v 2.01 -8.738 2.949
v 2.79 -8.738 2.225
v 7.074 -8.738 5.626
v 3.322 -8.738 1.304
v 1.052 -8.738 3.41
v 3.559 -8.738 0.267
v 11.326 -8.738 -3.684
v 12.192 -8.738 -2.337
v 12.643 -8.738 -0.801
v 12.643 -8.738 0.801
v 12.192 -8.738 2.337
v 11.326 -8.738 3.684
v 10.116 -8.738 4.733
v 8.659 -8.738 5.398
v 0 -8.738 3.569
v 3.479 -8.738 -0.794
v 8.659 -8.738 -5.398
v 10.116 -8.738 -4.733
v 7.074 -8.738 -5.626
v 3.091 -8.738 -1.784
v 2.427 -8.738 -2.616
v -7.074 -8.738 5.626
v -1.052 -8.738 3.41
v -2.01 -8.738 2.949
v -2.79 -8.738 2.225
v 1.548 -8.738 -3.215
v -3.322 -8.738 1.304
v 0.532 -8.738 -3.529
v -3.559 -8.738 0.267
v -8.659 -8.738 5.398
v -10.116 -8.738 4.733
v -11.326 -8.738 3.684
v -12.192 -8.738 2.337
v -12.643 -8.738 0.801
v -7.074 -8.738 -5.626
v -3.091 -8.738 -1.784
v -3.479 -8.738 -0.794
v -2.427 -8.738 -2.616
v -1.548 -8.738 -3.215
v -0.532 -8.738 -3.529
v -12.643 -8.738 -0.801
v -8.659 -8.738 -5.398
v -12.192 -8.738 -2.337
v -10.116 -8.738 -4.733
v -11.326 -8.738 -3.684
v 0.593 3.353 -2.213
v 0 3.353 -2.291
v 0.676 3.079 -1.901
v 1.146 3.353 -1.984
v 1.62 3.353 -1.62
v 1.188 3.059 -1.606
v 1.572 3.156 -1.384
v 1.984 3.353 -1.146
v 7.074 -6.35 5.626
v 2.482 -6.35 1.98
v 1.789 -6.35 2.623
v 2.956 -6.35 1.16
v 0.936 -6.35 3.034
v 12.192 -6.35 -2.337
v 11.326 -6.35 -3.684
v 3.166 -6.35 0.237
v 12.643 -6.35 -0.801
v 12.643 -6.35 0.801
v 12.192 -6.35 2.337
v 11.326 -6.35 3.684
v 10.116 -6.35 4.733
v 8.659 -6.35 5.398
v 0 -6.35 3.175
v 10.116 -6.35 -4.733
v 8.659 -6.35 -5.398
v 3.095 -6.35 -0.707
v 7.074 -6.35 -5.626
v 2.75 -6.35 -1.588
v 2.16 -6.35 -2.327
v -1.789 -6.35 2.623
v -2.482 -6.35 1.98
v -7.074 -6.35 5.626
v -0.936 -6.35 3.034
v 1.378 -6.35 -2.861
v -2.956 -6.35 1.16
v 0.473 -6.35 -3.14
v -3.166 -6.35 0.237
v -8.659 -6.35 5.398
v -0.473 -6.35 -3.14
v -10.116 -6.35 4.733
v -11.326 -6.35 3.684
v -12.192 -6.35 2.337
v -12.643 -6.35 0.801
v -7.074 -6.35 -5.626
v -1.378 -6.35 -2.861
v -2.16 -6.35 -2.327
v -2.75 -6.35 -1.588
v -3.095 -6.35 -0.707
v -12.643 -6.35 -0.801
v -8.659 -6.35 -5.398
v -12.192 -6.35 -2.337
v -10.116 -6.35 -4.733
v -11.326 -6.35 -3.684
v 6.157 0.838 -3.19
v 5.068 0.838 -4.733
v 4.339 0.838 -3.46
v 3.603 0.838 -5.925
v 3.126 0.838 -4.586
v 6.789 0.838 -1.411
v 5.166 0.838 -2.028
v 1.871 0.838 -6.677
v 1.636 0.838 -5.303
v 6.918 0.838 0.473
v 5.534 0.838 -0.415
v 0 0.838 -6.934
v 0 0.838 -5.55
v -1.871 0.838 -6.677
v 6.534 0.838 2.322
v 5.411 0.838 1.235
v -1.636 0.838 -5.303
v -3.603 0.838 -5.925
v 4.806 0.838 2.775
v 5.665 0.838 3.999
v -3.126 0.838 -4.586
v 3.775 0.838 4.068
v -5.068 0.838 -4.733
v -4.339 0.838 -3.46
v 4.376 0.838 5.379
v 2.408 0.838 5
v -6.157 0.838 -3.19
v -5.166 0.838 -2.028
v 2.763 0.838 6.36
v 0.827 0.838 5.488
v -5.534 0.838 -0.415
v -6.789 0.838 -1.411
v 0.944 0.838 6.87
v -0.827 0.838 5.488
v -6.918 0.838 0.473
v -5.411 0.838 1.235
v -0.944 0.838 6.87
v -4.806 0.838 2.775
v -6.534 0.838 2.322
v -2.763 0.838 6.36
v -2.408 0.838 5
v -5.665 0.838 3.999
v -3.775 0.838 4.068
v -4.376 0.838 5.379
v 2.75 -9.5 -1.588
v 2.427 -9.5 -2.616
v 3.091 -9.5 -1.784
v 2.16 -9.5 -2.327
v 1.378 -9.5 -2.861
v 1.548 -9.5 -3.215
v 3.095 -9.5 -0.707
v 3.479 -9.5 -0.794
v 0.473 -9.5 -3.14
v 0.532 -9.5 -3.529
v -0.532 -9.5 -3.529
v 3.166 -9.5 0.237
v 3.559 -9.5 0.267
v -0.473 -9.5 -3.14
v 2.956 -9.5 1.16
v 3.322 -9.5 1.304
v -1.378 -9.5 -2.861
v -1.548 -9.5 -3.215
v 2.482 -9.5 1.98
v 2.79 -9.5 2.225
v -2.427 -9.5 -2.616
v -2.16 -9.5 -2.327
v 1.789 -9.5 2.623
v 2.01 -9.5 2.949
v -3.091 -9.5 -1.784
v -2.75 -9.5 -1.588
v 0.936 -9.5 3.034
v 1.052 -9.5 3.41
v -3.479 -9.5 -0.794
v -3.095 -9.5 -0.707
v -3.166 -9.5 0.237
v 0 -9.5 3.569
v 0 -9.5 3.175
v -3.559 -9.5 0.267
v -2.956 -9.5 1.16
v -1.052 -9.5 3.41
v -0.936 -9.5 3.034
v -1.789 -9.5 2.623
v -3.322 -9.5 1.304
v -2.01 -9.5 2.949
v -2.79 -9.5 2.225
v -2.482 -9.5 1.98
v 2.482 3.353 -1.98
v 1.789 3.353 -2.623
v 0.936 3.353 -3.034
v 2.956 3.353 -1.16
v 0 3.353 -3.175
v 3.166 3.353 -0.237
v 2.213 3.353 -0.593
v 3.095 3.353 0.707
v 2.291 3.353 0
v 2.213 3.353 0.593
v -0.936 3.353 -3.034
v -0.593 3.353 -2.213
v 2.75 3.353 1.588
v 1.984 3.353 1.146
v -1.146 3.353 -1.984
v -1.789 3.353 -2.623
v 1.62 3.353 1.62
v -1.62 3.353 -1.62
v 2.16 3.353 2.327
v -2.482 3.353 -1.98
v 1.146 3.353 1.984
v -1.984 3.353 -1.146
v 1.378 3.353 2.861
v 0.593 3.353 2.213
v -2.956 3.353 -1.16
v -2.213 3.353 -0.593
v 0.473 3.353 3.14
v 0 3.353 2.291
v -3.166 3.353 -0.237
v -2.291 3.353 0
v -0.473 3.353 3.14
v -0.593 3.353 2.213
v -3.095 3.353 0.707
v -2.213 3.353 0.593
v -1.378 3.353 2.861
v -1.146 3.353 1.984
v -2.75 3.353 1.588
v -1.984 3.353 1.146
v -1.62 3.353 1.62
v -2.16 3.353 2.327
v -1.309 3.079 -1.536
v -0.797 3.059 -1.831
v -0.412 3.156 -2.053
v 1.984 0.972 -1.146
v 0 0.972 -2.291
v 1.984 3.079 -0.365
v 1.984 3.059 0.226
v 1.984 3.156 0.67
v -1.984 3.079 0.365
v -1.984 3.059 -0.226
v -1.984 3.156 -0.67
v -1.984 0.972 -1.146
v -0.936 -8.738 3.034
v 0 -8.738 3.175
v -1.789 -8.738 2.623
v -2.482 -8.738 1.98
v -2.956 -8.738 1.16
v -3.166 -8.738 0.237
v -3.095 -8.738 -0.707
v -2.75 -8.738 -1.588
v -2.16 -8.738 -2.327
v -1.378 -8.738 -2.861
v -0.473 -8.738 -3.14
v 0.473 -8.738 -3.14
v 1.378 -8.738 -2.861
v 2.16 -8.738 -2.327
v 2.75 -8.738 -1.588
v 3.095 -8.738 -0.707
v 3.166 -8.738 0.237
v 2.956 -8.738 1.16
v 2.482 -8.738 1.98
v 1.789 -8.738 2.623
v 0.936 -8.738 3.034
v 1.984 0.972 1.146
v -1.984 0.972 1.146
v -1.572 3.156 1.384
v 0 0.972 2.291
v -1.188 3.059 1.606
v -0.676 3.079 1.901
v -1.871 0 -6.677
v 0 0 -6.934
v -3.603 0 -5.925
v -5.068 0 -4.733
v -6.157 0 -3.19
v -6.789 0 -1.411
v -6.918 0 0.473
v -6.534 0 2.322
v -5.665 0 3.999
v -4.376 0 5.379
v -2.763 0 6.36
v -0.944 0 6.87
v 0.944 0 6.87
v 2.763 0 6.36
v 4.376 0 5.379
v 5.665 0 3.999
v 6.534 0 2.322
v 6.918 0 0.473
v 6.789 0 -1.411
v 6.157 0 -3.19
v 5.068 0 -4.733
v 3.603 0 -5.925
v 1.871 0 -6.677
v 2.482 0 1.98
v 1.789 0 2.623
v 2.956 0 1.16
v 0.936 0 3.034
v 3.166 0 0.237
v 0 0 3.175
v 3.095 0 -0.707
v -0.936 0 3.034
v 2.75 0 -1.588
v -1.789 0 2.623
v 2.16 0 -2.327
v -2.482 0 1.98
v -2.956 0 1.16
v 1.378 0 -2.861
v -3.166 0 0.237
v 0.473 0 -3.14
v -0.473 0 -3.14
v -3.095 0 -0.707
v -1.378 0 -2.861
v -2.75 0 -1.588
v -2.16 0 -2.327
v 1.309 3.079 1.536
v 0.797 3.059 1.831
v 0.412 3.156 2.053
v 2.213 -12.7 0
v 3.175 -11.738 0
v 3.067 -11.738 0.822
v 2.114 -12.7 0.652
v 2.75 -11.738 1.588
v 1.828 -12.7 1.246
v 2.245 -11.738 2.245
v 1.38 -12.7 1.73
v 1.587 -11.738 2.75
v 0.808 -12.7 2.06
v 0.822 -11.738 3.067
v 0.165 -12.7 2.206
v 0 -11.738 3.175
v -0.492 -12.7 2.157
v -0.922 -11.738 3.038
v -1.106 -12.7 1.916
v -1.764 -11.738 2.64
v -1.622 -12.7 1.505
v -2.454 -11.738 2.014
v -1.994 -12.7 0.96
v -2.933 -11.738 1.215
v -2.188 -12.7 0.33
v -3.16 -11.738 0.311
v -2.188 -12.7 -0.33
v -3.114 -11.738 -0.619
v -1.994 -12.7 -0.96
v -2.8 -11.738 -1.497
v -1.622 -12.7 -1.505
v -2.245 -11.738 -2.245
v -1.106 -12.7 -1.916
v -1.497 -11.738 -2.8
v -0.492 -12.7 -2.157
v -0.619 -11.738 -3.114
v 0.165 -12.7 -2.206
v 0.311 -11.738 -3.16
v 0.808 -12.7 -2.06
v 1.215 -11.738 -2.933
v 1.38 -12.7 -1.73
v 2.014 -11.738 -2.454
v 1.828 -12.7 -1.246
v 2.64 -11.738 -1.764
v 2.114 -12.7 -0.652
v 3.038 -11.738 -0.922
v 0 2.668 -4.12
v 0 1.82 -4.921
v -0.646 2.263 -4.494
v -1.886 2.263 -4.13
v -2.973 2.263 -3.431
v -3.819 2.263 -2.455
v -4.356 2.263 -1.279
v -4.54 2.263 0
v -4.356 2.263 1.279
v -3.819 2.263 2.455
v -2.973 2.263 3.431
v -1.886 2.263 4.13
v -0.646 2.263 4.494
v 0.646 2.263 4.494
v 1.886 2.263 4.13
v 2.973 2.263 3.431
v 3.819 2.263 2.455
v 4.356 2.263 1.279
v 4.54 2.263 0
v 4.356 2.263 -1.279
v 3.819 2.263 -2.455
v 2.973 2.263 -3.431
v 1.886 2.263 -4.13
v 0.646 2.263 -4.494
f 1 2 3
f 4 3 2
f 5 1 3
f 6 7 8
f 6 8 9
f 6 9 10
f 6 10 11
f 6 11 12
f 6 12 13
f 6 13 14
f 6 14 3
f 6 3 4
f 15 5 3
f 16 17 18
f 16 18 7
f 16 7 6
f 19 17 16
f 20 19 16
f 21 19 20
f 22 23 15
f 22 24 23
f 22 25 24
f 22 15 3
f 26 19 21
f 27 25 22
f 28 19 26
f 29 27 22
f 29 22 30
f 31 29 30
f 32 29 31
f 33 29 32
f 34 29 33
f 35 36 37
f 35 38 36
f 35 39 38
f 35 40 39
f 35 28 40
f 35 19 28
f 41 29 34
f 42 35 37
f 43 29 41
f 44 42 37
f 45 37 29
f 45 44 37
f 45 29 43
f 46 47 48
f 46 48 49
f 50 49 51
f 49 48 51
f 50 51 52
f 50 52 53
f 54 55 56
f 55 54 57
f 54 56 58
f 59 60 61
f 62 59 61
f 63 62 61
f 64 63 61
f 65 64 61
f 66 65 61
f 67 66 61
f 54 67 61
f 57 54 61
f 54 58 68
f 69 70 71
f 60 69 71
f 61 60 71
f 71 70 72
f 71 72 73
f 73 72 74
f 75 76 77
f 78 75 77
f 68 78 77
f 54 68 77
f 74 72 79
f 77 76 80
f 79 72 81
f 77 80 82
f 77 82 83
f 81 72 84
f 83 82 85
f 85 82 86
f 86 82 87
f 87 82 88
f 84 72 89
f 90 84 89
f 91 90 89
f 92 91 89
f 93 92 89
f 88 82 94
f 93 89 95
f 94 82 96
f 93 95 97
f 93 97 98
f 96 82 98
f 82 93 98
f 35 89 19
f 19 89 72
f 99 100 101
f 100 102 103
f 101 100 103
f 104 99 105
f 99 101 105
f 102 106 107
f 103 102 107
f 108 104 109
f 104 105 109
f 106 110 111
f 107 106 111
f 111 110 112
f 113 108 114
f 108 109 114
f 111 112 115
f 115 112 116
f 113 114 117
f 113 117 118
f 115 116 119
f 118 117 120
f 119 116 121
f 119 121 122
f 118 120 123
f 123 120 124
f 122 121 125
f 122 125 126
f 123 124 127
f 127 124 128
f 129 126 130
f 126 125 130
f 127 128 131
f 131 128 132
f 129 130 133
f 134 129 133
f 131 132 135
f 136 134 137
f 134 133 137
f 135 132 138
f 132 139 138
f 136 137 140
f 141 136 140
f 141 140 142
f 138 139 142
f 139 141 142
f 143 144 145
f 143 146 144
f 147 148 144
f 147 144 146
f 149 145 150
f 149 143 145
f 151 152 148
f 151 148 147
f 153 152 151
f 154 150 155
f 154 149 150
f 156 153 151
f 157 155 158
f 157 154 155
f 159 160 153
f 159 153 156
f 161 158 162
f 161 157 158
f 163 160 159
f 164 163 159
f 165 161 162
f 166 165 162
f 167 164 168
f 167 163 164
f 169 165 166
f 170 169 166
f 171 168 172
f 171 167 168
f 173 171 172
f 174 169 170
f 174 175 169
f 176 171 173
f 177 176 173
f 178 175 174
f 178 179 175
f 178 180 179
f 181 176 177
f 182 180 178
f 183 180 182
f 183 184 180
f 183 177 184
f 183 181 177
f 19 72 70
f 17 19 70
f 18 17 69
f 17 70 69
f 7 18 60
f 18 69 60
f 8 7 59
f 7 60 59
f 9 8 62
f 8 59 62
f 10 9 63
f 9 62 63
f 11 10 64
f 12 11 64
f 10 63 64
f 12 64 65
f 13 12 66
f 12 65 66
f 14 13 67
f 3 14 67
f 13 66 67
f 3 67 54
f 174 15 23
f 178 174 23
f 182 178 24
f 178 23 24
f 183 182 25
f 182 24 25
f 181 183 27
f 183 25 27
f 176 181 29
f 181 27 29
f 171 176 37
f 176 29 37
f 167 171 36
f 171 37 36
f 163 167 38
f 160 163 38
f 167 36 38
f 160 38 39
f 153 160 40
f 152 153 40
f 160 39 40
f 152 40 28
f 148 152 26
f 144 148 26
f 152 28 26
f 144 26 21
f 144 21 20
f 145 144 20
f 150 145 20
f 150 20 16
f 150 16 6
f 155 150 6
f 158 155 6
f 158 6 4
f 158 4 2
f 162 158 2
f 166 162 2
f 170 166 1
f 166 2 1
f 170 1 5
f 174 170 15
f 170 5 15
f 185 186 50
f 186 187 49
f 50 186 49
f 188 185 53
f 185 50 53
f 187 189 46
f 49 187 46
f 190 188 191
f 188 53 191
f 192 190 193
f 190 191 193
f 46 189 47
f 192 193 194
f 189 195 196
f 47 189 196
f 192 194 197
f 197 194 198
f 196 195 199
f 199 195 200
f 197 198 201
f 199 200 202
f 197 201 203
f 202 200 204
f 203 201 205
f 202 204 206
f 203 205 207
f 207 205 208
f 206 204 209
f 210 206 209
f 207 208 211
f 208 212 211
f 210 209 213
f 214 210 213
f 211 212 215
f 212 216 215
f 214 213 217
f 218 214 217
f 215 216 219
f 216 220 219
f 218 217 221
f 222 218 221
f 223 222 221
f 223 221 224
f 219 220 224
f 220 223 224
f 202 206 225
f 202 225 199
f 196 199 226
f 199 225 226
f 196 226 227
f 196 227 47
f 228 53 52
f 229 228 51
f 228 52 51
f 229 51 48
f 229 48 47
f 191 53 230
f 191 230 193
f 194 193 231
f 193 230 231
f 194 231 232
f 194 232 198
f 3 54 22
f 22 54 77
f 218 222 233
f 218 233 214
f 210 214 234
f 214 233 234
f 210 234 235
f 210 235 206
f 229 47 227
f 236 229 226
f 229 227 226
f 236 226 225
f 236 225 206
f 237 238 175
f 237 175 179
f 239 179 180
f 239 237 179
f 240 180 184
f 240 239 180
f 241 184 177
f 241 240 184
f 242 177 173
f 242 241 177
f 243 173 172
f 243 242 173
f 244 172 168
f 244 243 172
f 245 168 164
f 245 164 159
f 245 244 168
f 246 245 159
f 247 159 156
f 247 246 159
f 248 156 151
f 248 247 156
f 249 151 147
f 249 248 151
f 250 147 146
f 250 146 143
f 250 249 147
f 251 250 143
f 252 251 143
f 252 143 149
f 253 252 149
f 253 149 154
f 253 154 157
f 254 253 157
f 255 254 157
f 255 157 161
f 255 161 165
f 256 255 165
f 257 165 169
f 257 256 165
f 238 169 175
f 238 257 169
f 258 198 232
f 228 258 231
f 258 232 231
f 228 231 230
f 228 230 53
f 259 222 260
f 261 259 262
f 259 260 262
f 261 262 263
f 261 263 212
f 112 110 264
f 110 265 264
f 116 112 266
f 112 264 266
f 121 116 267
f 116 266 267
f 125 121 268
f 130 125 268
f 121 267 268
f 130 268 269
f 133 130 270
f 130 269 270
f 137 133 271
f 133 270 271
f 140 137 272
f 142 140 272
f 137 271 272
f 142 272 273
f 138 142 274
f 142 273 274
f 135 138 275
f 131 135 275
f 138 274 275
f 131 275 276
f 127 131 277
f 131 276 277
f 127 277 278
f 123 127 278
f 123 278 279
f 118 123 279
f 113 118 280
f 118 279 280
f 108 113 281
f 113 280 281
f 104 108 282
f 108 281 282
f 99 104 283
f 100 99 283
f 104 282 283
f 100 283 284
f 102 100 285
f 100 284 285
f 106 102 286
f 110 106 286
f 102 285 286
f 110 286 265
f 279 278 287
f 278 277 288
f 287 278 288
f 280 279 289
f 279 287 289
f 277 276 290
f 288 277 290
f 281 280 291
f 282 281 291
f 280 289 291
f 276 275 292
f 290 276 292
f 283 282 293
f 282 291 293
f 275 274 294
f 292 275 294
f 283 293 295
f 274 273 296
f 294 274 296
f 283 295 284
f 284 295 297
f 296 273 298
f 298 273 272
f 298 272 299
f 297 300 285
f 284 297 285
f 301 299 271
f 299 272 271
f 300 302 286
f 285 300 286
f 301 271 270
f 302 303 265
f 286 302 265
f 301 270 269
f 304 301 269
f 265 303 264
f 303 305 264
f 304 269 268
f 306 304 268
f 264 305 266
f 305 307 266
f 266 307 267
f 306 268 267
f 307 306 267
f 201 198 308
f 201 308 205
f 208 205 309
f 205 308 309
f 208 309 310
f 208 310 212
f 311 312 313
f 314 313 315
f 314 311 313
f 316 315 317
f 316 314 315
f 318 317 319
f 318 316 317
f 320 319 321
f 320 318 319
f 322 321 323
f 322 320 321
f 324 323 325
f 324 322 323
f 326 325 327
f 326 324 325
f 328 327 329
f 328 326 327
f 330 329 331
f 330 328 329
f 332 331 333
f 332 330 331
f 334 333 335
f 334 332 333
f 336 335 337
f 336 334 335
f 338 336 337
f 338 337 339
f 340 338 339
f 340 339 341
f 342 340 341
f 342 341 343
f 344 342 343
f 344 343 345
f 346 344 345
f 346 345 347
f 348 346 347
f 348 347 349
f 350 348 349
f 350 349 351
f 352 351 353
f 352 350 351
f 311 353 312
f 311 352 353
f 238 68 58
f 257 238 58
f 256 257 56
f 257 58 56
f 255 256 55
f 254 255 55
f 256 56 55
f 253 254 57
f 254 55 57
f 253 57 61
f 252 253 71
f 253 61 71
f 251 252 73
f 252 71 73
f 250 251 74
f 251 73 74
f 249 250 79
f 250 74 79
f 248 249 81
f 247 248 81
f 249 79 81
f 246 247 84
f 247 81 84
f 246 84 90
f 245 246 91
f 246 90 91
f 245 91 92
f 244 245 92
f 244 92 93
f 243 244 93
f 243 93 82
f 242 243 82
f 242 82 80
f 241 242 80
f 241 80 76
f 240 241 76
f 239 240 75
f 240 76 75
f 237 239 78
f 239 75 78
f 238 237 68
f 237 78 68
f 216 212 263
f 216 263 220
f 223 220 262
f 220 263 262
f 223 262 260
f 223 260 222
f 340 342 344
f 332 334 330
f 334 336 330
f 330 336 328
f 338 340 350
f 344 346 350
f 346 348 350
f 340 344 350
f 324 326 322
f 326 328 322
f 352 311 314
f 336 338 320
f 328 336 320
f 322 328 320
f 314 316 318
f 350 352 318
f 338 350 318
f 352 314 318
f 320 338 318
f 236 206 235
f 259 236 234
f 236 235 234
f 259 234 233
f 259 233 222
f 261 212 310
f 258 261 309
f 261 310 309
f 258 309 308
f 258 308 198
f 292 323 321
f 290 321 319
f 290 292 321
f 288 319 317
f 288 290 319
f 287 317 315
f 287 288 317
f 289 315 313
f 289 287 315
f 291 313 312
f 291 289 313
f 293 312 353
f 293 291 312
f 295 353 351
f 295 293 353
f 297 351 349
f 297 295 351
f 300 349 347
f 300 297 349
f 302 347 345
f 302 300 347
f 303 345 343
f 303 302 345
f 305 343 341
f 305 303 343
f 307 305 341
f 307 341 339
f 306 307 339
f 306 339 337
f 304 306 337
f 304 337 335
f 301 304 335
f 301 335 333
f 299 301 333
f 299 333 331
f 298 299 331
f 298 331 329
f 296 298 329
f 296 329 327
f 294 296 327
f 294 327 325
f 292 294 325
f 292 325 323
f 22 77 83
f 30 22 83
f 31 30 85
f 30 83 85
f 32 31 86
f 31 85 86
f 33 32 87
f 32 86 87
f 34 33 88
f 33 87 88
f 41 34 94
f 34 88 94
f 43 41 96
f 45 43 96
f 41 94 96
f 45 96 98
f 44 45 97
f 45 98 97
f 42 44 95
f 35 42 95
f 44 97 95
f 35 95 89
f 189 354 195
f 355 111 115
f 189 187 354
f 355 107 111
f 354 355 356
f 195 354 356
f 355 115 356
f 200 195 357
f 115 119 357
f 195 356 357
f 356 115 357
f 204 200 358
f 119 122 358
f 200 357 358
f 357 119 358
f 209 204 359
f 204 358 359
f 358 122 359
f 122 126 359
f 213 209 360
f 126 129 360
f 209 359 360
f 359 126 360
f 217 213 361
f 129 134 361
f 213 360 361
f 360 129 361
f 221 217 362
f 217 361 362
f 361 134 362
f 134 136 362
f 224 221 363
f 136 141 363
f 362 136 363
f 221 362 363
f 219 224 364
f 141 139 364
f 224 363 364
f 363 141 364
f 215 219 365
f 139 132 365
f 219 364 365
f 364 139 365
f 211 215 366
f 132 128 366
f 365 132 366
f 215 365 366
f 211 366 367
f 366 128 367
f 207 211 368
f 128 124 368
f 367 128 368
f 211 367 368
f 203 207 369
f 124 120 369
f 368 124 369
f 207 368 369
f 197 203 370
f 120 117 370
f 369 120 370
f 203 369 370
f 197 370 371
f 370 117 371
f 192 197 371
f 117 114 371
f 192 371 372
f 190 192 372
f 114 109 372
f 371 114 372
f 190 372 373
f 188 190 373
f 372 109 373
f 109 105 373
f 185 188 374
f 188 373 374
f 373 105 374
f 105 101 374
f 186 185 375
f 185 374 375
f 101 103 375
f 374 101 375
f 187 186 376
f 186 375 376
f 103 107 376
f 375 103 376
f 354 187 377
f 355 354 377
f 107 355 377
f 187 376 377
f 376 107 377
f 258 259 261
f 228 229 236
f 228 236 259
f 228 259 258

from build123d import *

# Parameters (mm, degrees)
SKETCH1_R           = 3.175
BOSS_EXTRUDE1_DEPTH = 12.7
SKETCH4_OUTSIDE_W   = 14
SKETCH4_OUTSIDE_H   = 14
SKETCH4_OUTSIDE_R   = 2.21262927
CUT_EXTRUDE1_DEPTH  = 1.27
CUT_EXTRUDE1_DRAFT  = -45
CUT_EXTRUDE2_DEPTH  = 2.38125
BOSS_EXTRUDE2_START = -6.35
SKETCH8_R           = 3.175
BOSS_EXTRUDE2_DEPTH = 2.3876
SKETCH9_R           = 3.5687
SKETCH9_R_2         = 3.175
BOSS_EXTRUDE3_DEPTH = 0.762


with BuildPart() as part:
    # Sketch1 → Boss-Extrude1 (new body)
    with BuildSketch(Plane(origin=(0, 0, 0), x_dir=(1, 0, 0), z_dir=(0, 1, 0))):
        Circle(SKETCH1_R)
    extrude(amount=-BOSS_EXTRUDE1_DEPTH)


with BuildPart() as cut_extrude1_tool:
    # Sketch4 outside → Cut-Extrude1 (with draft: the straight prism first)
    with BuildSketch(Plane.XZ.offset(12.7)):
        Rectangle(SKETCH4_OUTSIDE_W, SKETCH4_OUTSIDE_H)
        Circle(SKETCH4_OUTSIDE_R, mode=Mode.SUBTRACT)
    extrude(amount=-CUT_EXTRUDE1_DEPTH)
    # Cut-Extrude1: the draft: its side faces are tilted about the plane it starts from
    cut_extrude1_sides = [cut_extrude1_tool.faces().sort_by_distance(p)[0] for p in [
        (0, -12.065, -7),
        (7, -12.065, 0),
        (0, -12.065, 7),
        (-7, -12.065, 0),
        (-2.21262927, -12.065, 0),
    ]]
    draft(cut_extrude1_sides, Plane.XZ.offset(12.7), CUT_EXTRUDE1_DRAFT)


with BuildPart() as part_1:
    add(part.part)

    # Cut-Extrude1: cut by cut_extrude1_tool
    add(cut_extrude1_tool.part, mode=Mode.SUBTRACT)

    # Sketch5 → Revolve1 (revolve)
    with BuildSketch(Plane.XY):
        with BuildLine():
            Line((0, 0), (0, 3.3528))
            Line((0, 3.3528), (-3.175, 3.3528))
            ThreePointArc((-3.175, 3.3528), (-4.540019085, 2.263204136), (-5.5499, 0.8382))
            Line((-5.5499, 0.8382), (-6.9342, 0.8382))
            Line((-6.9342, 0.8382), (-6.9342, 0))
            Line((-6.9342, 0), (0, 0))
        make_face()
    revolve(axis=Axis((0, 0, 0), (0, 1, 0)))

    # Sketch6 → Cut-Extrude2 (cut)
    with BuildSketch(Plane(origin=(0, 3.3528, 0), x_dir=(1, 0, 0), z_dir=(0, 1, 0))):
        Polygon((0, 2.291358881), (-1.984375, 1.14567944), (-1.984375, -1.14567944), (0, -2.291358881), (1.984375, -1.14567944), (1.984375, 1.14567944), align=None)
    extrude(amount=-CUT_EXTRUDE2_DEPTH, mode=Mode.SUBTRACT)

    # Cut-Extrude3 cone 1 section (through the dimple's axis) → Cut-Extrude3 (revolve, cut)
    with BuildSketch(Plane(origin=(0, 3.3528, 0), x_dir=(0, 0, 1), z_dir=(1, 0, 0))):
        Polygon((0, 0), (2.291358881, 0), (0, 2.291358881), align=None)
    revolve(axis=Axis((0, 3.3528, 0), (0, -1, 0)), mode=Mode.SUBTRACT)


with BuildPart() as body_2:
    # Sketch8 → Boss-Extrude2 (new body)
    with BuildSketch(Plane(origin=(0, 0, 0), x_dir=(1, 0, 0), z_dir=(0, 1, 0)).offset(BOSS_EXTRUDE2_START)):
        with BuildLine():
            Line((-7.0739, 5.6261), (7.0739, 5.6261))
            ThreePointArc((7.0739, 5.6261), (12.7, 0), (7.0739, -5.6261))
            Line((7.0739, -5.6261), (-7.0739, -5.6261))
            ThreePointArc((-7.0739, -5.6261), (-12.7, 0), (-7.0739, 5.6261))
        make_face()
        Circle(SKETCH8_R, mode=Mode.SUBTRACT)
    extrude(amount=-BOSS_EXTRUDE2_DEPTH)

    # Sketch9 → Boss-Extrude3 (add)
    with BuildSketch(Plane.XZ.offset(8.7376)):
        Circle(SKETCH9_R)
        Circle(SKETCH9_R_2, mode=Mode.SUBTRACT)
    extrude(amount=BOSS_EXTRUDE3_DEPTH)


solid = Compound([part_1.part, body_2.part])
